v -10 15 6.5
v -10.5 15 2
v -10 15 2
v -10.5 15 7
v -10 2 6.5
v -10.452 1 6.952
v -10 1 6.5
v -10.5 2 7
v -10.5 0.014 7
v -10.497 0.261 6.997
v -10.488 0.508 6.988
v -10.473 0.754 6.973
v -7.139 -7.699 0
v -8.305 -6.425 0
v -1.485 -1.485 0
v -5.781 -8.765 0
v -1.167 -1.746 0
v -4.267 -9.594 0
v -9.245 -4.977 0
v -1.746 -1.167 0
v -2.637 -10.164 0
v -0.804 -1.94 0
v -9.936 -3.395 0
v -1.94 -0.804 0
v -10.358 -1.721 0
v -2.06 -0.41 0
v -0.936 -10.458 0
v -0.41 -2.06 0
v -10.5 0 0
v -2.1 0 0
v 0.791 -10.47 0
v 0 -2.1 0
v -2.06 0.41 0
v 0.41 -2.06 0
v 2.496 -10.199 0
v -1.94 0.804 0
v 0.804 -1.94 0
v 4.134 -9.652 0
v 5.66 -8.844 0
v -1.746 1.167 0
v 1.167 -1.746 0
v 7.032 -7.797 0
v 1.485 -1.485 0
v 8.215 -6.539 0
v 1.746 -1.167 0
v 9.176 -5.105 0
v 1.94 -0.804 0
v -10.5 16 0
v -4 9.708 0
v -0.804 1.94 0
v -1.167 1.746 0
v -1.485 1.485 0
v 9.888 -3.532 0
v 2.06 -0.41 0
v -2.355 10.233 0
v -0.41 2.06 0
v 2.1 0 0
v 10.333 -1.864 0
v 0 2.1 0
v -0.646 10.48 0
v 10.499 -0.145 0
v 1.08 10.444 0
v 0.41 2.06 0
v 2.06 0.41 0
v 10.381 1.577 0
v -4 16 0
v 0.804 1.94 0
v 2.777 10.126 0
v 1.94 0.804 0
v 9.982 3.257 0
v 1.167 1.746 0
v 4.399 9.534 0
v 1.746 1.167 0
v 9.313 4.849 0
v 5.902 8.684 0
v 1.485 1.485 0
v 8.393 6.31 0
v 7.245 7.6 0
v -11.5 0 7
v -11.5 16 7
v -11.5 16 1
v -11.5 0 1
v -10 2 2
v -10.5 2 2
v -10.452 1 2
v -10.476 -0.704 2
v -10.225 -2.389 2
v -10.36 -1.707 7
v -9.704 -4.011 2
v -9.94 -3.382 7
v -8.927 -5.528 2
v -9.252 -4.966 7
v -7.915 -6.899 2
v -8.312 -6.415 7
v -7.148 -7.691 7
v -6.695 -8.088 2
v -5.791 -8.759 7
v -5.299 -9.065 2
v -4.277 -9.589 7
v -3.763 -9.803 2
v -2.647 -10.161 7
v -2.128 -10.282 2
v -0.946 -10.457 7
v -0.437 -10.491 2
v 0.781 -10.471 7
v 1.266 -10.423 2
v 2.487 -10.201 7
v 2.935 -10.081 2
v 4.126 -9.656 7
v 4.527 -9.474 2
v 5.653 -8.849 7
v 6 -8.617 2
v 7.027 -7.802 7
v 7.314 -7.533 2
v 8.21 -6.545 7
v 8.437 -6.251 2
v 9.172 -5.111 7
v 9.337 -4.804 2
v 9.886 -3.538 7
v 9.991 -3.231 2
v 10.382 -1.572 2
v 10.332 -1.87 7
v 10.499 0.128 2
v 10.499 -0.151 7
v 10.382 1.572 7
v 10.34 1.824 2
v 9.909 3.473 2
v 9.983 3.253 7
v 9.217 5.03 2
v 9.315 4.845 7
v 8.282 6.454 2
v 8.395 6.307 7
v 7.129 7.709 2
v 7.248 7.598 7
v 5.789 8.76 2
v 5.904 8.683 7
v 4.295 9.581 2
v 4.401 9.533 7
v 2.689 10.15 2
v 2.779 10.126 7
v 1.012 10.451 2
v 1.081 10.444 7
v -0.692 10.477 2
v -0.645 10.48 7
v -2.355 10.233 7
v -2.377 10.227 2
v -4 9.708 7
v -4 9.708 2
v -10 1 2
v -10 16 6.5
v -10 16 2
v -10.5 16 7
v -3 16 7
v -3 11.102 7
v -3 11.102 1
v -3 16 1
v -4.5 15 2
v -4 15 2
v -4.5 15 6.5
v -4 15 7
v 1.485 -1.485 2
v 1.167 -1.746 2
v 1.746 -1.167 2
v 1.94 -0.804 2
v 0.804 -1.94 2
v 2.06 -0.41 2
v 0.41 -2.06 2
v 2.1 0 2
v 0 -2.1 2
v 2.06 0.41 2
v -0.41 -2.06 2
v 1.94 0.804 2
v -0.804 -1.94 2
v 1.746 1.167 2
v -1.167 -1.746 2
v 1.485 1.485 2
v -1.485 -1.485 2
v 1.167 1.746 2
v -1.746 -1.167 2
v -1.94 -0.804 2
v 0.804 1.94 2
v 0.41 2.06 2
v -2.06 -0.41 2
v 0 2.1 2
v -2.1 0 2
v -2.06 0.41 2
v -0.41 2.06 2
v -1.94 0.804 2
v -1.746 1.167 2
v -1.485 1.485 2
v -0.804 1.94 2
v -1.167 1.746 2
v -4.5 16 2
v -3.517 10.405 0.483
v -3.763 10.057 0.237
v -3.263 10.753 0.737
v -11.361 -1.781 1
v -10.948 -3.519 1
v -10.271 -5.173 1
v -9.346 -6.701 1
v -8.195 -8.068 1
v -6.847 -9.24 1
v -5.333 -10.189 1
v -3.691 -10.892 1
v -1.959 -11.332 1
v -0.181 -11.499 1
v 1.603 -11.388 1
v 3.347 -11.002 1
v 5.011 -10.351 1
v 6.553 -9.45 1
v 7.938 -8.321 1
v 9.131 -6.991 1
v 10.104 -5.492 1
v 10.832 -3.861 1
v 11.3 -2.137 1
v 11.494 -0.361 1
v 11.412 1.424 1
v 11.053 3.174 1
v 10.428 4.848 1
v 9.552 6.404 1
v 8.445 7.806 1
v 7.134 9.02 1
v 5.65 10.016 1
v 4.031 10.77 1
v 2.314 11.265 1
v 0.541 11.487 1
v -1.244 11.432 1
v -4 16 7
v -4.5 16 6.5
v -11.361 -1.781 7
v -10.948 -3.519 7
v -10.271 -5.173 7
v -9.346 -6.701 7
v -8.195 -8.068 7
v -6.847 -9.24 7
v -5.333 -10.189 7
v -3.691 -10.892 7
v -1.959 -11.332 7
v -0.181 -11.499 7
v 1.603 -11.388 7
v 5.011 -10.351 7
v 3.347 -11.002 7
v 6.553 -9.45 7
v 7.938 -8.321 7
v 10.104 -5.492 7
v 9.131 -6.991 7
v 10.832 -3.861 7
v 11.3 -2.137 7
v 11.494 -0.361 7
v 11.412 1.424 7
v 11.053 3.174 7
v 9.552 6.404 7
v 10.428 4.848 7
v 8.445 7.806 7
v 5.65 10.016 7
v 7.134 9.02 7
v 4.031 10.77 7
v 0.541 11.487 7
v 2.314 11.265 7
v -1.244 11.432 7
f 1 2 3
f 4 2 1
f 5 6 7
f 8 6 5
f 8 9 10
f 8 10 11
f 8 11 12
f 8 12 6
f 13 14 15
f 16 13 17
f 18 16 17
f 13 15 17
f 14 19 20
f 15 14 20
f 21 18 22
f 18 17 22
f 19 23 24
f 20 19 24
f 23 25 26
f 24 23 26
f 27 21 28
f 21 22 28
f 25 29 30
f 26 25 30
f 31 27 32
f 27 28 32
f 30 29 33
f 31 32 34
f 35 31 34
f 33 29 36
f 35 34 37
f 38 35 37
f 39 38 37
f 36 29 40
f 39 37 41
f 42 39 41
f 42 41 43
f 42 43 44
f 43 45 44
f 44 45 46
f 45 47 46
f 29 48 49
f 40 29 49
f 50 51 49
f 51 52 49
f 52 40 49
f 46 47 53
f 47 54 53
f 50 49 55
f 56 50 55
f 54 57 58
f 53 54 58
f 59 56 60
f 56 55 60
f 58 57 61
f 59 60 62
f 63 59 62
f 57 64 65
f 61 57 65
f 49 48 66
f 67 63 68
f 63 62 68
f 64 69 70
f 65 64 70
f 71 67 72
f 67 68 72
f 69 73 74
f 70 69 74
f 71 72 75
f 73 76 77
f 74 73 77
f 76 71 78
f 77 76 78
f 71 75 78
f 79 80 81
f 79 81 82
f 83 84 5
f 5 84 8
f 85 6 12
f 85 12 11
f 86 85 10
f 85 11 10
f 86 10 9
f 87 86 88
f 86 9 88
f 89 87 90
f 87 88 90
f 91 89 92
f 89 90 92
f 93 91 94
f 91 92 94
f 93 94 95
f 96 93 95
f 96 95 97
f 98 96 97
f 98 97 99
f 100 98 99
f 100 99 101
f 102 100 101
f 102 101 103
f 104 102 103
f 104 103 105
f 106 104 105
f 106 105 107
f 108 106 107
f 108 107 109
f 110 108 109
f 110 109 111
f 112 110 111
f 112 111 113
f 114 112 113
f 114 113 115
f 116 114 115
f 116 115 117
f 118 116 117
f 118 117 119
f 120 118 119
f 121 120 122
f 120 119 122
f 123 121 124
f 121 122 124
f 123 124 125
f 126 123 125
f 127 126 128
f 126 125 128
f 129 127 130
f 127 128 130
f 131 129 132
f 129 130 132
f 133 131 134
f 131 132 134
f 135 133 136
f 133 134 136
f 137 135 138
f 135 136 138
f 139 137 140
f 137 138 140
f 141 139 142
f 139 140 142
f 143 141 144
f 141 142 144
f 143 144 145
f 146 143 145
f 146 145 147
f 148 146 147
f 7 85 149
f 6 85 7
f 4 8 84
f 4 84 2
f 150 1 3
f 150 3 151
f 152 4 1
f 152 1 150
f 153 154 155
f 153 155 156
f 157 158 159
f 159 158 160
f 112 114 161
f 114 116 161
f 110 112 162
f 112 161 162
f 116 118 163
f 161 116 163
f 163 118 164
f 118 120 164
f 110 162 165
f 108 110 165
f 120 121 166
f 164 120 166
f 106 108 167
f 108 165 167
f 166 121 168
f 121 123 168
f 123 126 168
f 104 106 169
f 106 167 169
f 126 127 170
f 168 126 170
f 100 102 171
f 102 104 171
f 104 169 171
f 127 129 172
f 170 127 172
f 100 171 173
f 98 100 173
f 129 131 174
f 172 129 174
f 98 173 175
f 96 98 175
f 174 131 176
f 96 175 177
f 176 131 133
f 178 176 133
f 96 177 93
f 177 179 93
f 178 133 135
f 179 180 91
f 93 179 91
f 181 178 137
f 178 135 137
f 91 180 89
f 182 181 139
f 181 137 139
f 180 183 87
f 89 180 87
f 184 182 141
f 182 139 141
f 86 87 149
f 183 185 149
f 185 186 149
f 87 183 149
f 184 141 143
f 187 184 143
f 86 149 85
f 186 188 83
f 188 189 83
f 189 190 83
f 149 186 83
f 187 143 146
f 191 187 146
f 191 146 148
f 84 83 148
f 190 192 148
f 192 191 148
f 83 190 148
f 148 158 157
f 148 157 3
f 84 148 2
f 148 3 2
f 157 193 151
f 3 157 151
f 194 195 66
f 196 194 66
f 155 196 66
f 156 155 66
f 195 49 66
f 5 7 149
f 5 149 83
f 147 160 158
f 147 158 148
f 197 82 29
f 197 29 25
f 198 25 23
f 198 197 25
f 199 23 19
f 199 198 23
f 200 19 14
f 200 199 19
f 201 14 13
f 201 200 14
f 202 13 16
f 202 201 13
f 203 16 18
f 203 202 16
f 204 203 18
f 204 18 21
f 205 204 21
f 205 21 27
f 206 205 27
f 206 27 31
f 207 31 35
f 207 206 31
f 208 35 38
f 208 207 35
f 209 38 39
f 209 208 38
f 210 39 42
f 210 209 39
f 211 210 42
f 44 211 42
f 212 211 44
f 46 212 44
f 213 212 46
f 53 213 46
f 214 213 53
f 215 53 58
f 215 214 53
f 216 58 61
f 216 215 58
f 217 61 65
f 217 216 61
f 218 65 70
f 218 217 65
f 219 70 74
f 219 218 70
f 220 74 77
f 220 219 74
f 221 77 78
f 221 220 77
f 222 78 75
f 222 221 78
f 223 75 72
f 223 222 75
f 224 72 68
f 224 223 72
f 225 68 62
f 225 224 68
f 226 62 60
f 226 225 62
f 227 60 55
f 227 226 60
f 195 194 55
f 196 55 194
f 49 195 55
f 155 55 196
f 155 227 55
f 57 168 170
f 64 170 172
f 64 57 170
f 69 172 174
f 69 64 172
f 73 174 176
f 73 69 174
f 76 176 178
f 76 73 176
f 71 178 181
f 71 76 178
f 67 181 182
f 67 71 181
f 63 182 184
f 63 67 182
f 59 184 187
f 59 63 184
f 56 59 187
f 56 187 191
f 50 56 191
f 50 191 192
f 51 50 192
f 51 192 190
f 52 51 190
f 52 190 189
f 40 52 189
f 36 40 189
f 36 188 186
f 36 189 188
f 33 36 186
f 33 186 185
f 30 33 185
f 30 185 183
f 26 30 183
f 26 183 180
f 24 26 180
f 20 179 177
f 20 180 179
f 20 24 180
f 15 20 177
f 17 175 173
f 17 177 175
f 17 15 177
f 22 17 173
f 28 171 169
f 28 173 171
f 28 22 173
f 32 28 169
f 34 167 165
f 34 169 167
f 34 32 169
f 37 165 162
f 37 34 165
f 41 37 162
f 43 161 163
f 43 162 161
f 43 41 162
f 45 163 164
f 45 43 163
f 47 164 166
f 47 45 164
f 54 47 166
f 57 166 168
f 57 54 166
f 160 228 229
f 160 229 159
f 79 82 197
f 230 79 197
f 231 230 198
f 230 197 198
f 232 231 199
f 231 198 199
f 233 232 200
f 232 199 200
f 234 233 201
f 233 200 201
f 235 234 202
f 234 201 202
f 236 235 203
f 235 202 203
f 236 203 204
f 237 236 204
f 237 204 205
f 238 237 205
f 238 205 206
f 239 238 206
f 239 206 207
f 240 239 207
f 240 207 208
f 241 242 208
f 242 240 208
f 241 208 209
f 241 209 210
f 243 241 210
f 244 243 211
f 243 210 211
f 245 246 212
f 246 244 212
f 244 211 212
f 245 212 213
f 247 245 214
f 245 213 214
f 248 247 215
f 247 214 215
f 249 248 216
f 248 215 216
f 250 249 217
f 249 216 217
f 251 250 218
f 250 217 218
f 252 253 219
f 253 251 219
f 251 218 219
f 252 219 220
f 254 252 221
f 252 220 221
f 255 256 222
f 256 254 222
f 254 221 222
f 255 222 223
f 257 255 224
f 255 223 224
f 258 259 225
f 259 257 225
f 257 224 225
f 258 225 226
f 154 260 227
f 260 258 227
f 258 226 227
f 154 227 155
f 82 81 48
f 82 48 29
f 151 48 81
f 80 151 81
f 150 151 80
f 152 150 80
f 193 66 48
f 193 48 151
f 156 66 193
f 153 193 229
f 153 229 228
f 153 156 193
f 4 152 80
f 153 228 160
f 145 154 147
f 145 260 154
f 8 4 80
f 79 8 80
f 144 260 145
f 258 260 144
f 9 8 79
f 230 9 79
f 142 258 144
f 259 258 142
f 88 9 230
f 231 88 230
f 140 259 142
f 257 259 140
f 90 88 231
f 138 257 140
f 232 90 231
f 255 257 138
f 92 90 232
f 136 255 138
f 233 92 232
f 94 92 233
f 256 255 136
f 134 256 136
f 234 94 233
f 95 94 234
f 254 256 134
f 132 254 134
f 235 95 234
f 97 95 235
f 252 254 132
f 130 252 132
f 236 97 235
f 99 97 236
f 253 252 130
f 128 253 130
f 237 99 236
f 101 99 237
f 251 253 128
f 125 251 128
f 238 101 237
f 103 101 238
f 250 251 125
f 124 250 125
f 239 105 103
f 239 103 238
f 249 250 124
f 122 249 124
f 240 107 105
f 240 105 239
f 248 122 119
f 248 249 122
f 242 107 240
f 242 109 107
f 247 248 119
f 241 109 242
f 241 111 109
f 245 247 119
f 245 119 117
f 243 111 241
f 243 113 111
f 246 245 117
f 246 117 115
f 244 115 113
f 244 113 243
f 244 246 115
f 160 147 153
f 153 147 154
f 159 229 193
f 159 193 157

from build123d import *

# Parameters (mm, degrees)
F0_R      = 11.5
F0_R_2    = 2.1
F1_DEPTH  = 7
F2_R      = 10.5
F3_DEPTH  = 5
F5_DEPTH  = 7
F6_W      = 8.5
F6_H      = 2
F7_DEPTH  = 12.8
F8_W      = 6.5
F8_H      = 5
F9_DEPTH  = 15
F10_W     = 1
F10_H     = 5
F11_DEPTH = 0.5
F12_W     = 1
F12_H     = 5
F13_DEPTH = 0.5
F14_SIZE  = 0.49999
F15_SIZE  = 1


# Not quite as in the source:
# - a fillet or chamfer is up to 0.001 mm smaller than in the source, because OpenCascade refuses the exact size


with BuildPart() as f1:
    # F0 (on Top) → F1 (new body)
    with BuildSketch(Plane.XY):
        Circle(F0_R)
        Circle(F0_R_2, mode=Mode.SUBTRACT)
    extrude(amount=F1_DEPTH)

    # F2 (on face) → F3 (cut)
    with BuildSketch(Plane.XY.offset(7)):
        Circle(F2_R)
    extrude(amount=-F3_DEPTH, mode=Mode.SUBTRACT)

    # F4 (on face) → F5 (join)
    with BuildSketch(Plane.XY.offset(7)):
        with BuildLine():
            Line((-11.5, 16), (-11.5, 0))
            ThreePointArc((-11.5, 0), (-11.2472218792, 2.3979157617), (-10.5, 4.6904157598))
            Line((-10.5, 4.6904157598), (-10.5, 16))
            Line((-10.5, 16), (-11.5, 16))
        make_face()
        with BuildLine():
            ThreePointArc((-4, 10.7819293264), (-3.5036523196, 10.9532835453), (-3, 11.1018016556))
            Line((-3, 11.1018016556), (-3, 16))
            Line((-3, 16), (-4, 16))
            Line((-4, 16), (-4, 10.7819293264))
        make_face()
    extrude(amount=-F5_DEPTH)

    # F6 (on face) → F7 (join)
    with BuildSketch(Plane(origin=(0, 16, 0), x_dir=(-1, 0, 0), z_dir=(0, 1, 0))):
        with Locations((7.25, 1)):
            Rectangle(F6_W, F6_H)
    extrude(amount=-F7_DEPTH)

    # F8 (on face) → F9 (cut)
    with BuildSketch(Plane(origin=(0, 16, 0), x_dir=(-1, 0, 0), z_dir=(0, 1, 0))):
        with Locations((7.25, 4.5)):
            Rectangle(F8_W, F8_H)
    extrude(amount=-F9_DEPTH, mode=Mode.SUBTRACT)

    # F10 (on face) → F11 (join)
    with BuildSketch(Plane.YZ.offset(-10.5)):
        with Locations((1.5, 4.5)):
            Rectangle(F10_W, F10_H)
        with Locations((15.5, 4.5)):
            Rectangle(F10_W, F10_H)
    extrude(amount=F11_DEPTH)

    # F12 (on face) → F13 (join)
    with BuildSketch(Plane(origin=(-4, 0, 0), x_dir=(0, -1, 0), z_dir=(-1, 0, 0))):
        with Locations((-15.5, 4.5)):
            Rectangle(F12_W, F12_H)
    extrude(amount=F13_DEPTH)

    # F14 (size 0.5 in the source; OpenCascade refuses exactly that, so slightly less here)
    f14_edges = [f1.edges().sort_by_distance(p)[0] for p in [
        (-10, 1.5, 7),
        (-10, 15.5, 7),
        (-4.5, 15.5, 7),
    ]]
    chamfer(f14_edges, length=F14_SIZE)

    # F15
    f15_edges = [f1.edges().sort_by_distance(p)[0] for p in [
        (9.130991, -6.991066, 0),
        (-3, 13.550901, 0),
        (-11.5, 8, 0),
    ]]
    chamfer(f15_edges, length=F15_SIZE)


solid = f1.part
